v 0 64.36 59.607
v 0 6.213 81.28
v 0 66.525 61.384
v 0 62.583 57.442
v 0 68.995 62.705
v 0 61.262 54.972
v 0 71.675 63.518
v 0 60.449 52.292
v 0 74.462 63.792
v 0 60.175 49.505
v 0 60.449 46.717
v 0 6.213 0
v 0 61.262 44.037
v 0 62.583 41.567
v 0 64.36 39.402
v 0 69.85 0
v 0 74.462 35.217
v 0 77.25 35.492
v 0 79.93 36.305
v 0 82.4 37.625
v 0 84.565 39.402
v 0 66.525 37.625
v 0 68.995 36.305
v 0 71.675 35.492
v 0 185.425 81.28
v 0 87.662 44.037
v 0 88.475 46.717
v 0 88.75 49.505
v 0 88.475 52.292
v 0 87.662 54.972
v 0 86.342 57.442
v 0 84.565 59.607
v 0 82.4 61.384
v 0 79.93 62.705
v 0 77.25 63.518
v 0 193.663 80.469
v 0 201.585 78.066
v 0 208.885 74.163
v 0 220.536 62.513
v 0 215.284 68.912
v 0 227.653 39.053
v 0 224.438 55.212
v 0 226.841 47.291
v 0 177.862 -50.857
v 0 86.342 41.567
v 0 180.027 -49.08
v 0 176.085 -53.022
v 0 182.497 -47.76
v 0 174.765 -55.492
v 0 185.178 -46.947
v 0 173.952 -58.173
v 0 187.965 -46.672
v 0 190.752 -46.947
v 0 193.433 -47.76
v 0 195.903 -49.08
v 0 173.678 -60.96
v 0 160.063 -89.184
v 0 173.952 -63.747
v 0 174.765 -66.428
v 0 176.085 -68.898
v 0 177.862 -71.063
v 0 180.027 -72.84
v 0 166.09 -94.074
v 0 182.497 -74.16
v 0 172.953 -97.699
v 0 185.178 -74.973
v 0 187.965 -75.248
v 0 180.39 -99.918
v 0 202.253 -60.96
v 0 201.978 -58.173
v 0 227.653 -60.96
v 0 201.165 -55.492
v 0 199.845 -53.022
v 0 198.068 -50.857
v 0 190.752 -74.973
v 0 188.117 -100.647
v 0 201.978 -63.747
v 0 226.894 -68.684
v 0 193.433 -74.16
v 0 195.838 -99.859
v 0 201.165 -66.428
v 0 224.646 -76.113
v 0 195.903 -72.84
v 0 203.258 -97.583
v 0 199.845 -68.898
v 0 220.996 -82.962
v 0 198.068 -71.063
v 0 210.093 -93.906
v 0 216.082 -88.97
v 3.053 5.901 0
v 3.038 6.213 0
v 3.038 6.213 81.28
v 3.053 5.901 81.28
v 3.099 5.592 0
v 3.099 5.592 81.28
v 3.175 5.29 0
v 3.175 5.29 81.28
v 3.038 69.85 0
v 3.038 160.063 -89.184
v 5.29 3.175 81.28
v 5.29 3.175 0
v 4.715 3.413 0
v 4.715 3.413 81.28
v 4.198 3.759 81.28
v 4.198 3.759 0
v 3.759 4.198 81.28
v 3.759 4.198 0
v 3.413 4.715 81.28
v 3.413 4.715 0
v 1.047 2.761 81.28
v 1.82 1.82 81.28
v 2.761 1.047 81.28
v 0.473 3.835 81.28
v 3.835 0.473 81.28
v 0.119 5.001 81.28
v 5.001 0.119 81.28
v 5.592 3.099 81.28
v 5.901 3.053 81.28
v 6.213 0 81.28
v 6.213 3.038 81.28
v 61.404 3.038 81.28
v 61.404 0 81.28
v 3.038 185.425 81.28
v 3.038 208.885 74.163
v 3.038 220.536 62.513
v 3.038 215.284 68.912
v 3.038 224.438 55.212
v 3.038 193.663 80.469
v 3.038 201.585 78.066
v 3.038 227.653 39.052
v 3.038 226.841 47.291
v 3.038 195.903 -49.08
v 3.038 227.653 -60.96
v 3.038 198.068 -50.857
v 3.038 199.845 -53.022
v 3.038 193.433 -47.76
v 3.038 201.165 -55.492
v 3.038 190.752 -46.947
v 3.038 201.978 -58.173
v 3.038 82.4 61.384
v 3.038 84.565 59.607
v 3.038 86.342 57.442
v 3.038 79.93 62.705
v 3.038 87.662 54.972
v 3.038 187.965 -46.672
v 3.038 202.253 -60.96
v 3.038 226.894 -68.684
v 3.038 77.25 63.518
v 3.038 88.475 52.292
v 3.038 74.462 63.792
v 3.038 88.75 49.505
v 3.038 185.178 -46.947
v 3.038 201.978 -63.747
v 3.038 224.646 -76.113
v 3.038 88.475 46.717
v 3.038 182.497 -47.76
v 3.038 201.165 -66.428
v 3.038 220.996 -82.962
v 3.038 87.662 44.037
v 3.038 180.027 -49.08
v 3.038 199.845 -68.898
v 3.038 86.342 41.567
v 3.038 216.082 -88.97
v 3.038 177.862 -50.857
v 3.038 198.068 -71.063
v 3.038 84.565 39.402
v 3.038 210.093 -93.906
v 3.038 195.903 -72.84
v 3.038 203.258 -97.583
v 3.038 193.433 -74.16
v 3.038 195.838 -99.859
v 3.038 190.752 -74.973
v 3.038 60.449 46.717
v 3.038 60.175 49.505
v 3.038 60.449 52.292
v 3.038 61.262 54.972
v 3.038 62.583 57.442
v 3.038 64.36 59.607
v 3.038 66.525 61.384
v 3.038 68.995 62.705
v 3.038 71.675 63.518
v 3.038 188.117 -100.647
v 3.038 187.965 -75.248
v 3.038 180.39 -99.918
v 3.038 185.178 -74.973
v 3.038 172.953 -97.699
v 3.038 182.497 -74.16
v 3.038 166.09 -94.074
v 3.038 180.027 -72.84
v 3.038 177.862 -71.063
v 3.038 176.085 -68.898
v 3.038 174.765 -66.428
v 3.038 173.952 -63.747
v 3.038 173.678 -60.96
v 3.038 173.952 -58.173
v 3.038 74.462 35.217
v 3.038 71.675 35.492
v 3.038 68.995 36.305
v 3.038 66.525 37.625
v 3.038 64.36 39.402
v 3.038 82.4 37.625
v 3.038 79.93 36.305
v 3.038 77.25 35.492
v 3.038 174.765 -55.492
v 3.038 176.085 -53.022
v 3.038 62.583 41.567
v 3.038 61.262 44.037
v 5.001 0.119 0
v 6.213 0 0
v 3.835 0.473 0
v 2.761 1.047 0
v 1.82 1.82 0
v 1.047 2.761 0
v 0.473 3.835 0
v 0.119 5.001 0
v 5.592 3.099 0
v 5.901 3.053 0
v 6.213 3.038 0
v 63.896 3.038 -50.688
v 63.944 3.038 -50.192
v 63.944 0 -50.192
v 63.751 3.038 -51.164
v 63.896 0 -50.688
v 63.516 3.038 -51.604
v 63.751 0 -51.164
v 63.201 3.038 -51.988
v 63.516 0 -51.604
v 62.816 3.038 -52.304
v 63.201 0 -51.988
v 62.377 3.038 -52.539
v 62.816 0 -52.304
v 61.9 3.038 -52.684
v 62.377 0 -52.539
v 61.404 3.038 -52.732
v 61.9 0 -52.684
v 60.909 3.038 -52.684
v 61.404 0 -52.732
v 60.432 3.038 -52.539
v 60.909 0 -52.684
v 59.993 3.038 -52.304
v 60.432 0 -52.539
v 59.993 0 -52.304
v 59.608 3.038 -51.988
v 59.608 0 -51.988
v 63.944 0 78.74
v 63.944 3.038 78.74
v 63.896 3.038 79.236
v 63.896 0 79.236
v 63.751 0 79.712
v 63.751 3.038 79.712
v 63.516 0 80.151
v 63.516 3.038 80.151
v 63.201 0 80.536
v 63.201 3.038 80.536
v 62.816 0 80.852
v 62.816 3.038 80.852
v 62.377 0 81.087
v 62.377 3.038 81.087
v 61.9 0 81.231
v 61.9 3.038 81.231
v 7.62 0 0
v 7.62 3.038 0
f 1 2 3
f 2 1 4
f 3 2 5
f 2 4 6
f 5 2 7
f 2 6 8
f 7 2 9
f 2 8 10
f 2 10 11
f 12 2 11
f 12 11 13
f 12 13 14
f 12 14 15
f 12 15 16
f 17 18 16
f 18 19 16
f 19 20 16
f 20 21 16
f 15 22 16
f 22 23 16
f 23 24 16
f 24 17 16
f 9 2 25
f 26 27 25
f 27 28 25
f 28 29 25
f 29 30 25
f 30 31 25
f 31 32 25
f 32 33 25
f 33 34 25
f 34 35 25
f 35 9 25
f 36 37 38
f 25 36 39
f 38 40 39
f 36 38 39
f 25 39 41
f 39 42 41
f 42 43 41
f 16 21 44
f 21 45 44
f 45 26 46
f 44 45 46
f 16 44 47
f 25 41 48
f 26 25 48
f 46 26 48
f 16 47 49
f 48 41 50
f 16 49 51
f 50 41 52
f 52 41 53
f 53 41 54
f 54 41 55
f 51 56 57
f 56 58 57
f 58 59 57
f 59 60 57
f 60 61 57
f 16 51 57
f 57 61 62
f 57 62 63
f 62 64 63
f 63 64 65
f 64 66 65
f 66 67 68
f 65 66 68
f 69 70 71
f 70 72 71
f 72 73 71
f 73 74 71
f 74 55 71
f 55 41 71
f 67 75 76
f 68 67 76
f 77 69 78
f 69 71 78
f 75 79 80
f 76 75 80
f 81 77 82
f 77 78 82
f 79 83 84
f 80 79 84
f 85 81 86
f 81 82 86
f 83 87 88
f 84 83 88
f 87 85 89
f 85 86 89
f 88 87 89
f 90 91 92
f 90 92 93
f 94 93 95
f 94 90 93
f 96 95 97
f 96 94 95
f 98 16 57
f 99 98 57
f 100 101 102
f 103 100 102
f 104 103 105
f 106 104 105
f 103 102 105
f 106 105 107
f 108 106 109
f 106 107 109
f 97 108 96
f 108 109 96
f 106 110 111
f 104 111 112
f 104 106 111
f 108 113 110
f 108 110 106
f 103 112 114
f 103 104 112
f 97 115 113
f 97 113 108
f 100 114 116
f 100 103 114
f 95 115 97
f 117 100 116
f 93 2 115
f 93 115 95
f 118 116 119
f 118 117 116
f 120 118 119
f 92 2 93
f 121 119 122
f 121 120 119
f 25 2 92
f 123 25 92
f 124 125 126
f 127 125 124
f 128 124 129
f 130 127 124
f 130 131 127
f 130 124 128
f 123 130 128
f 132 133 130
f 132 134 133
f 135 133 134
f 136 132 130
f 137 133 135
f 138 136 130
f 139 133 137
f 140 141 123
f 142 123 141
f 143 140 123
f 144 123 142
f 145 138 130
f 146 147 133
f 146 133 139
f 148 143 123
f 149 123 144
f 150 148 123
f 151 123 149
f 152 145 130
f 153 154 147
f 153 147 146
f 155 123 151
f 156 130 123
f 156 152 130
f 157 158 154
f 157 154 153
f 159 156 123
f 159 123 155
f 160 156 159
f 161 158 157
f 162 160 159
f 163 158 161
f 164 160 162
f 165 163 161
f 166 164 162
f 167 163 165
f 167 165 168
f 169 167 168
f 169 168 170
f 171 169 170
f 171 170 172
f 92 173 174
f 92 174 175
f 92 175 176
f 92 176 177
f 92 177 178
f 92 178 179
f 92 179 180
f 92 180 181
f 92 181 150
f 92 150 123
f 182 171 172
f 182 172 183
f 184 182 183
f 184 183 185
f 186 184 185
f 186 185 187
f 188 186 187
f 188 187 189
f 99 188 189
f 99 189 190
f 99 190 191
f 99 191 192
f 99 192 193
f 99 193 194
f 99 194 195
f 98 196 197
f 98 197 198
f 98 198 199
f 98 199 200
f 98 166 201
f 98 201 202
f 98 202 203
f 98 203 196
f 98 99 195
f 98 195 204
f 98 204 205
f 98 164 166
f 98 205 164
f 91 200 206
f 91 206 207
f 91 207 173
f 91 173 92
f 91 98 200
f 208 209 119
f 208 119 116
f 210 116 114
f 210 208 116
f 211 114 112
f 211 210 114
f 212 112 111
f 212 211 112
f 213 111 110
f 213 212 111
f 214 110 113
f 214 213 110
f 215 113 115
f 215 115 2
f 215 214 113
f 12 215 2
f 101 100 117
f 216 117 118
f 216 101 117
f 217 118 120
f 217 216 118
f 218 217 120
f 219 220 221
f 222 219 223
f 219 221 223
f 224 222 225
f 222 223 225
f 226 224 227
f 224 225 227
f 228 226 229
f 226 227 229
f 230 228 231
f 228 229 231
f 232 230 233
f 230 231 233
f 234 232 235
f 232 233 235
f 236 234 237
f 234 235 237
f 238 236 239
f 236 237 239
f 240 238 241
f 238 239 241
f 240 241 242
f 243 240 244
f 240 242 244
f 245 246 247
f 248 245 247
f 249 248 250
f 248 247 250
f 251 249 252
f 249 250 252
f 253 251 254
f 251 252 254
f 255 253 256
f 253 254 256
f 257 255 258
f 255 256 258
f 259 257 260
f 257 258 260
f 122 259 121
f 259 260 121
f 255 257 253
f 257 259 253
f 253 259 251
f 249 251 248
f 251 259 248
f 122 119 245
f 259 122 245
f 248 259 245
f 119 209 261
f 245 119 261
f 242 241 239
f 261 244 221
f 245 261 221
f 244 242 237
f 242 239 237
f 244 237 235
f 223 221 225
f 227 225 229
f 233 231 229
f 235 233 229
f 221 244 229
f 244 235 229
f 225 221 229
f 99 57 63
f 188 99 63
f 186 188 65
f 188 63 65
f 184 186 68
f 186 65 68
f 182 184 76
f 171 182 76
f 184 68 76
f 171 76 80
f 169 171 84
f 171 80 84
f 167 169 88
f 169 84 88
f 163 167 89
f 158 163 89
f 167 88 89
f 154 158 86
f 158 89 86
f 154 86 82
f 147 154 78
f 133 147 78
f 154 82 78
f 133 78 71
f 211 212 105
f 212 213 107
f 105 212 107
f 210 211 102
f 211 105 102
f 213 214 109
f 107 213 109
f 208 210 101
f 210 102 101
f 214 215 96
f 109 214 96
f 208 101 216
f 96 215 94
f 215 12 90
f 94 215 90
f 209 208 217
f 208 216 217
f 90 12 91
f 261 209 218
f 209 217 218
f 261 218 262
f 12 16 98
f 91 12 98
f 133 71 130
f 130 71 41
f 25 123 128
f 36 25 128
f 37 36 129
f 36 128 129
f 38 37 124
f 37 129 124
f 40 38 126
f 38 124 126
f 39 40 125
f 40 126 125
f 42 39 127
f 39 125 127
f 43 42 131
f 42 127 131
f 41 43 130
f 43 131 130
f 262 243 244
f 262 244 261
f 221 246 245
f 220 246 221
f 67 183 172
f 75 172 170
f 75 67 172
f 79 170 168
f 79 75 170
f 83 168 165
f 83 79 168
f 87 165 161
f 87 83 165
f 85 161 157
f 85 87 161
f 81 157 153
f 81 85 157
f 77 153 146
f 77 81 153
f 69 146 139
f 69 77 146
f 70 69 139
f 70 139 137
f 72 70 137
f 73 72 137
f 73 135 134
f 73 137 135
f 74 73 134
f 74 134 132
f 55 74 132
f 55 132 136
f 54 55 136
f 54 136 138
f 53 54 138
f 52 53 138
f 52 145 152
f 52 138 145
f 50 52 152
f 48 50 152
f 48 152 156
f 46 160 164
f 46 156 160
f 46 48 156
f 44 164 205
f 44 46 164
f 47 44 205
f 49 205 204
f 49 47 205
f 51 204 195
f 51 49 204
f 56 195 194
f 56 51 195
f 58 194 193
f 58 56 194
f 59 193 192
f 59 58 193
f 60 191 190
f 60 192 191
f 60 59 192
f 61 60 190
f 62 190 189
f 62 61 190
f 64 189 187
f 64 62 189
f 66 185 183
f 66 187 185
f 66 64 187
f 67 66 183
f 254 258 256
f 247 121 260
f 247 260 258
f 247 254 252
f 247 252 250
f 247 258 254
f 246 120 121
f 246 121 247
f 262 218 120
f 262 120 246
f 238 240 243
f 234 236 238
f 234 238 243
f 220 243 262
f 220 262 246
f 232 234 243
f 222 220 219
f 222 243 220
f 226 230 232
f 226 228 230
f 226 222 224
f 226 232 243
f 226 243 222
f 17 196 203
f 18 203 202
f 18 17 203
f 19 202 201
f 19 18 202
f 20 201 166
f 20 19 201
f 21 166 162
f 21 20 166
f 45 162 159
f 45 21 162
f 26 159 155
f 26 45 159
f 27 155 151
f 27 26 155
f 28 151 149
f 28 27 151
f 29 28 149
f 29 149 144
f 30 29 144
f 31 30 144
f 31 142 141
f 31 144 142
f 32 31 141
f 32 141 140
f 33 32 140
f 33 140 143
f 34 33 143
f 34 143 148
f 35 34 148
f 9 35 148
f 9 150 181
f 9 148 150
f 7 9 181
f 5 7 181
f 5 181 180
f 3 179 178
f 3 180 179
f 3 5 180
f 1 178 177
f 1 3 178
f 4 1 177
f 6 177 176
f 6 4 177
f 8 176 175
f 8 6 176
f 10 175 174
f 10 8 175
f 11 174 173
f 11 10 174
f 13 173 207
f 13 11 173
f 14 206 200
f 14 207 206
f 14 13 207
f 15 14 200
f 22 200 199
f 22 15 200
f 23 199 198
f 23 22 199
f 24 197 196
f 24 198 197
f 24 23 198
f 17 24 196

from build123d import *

# Parameters (mm, degrees)
SKETCH2_R              = 14.2875
SKETCH2_W              = 81.28
SKETCH2_H              = 3.175
BOSS_EXTRUDE1_DEPTH    = 3.175
SKETCH9_R              = 14.2875
CUT_EXTRUDE2_DEPTH     = 3.175
BOSS_EXTRUDE2_START    = 3.175
SKETCH2_3_W            = 81.28
SKETCH2_3_H            = 3.175
BOSS_EXTRUDE2_DEPTH    = 60.7695
BOSS_EXTRUDE3_DEPTH    = 3.175
FILLET1_R              = 2.54
FILLET2_R              = 42.2275
CONVERT_SOLID2_START   = -100.6475
CONVERT_SOLID2_DEPTH   = 181.9275
CONVERT_SOLID2_2_DEPTH = 81.28


# Read off the part's stored shape, not the designer's step: Convert-Solid2
with BuildPart() as part:
    # Sketch2 → Boss-Extrude1 (new body)
    # profile 1 of 2: a face of its own
    with BuildSketch(Plane(origin=(0, 0, 0), x_dir=(0, 0, -1), z_dir=(1, 0, 0))):
        with BuildLine():
            Line((0, 3.175), (0, 69.85))
            Line((0, 69.85), (89.183866464, 160.063269699))
            ThreePointArc((89.183866464, 160.063269699), (97.582743975, 203.257963311), (60.96, 227.65258))
            Line((60.96, 227.65258), (-81.28, 227.65258))
            Line((-81.28, 227.65258), (-81.28, 69.85))
            Line((-81.28, 69.85), (-81.28, 3.175))
            Line((-81.28, 3.175), (0, 3.175))
        make_face()
        with Locations((60.96, 187.96508)):
            Circle(SKETCH2_R, mode=Mode.SUBTRACT)
    # profile 2 of 2: a face of its own
    with BuildSketch(Plane(origin=(0, 0, 0), x_dir=(0, 0, -1), z_dir=(1, 0, 0))):
        with Locations((-40.64, 1.5875)):
            Rectangle(SKETCH2_W, SKETCH2_H)
    extrude(amount=BOSS_EXTRUDE1_DEPTH)

    # Sketch9 → Cut-Extrude2 (cut)
    with BuildSketch(Plane(origin=(0, 0, 0), x_dir=(0, 0, -1), z_dir=(1, 0, 0))):
        with Locations((-49.5046, 74.46228868)):
            Circle(SKETCH9_R)
    extrude(amount=CUT_EXTRUDE2_DEPTH, mode=Mode.SUBTRACT)

    # Sketch2<3> → Boss-Extrude2 (add)
    with BuildSketch(Plane(origin=(0, 0, 0), x_dir=(0, 0, -1), z_dir=(1, 0, 0)).offset(BOSS_EXTRUDE2_START)):
        with Locations((-40.64, 1.5875)):
            Rectangle(SKETCH2_3_W, SKETCH2_3_H)
    extrude(amount=BOSS_EXTRUDE2_DEPTH)

    # Sketch3 → Boss-Extrude3 (add)
    with BuildSketch(Plane(origin=(0, 3.175, 0), x_dir=(1, 0, 0), z_dir=(0, 1, 0))):
        Polygon((63.9445, 0), (63.9445, 56.3245), (7.62, 0), align=None)
    extrude(amount=-BOSS_EXTRUDE3_DEPTH)

    # Fillet1
    fillet1_edges = [part.edges().sort_by_distance(p)[0] for p in [
        (63.9445, 1.5875, 81.28),
        (63.9445, 1.5875, -56.3245),
    ]]
    fillet(fillet1_edges, radius=FILLET1_R)

    # Fillet2
    fillet2_edges = [part.edges().sort_by_distance(p)[0] for p in [
        (1.5875, 227.65258, 81.28),
    ]]
    fillet(fillet2_edges, radius=FILLET2_R)

    # Convert-Solid2 outline → Convert-Solid2 (cut)
    with BuildSketch(Plane.XY.offset(CONVERT_SOLID2_START)):
        with BuildLine():
            Line((0, 0), (6.21284, 0))
            ThreePointArc((6.21284, 0), (1.819698706, 1.819698706), (0, 6.21284))
            Line((0, 6.21284), (0, 0))
        make_face()
        with BuildLine():
            Line((6.21284, 3.03784), (63.9445, 3.03784))
            Line((63.9445, 3.03784), (63.9445, 3.175))
            Line((63.9445, 3.175), (5.289718593, 3.175))
            ThreePointArc((5.289718593, 3.175), (5.746212204, 3.072317193), (6.21284, 3.03784))
        make_face()
        with BuildLine():
            Line((3.175, 227.65258), (3.03784, 227.65258))
            Line((3.03784, 227.65258), (3.03784, 6.21284))
            ThreePointArc((3.03784, 6.21284), (3.072317193, 5.746212204), (3.175, 5.289718593))
            Line((3.175, 5.289718593), (3.175, 227.65258))
        make_face()
    extrude(amount=CONVERT_SOLID2_DEPTH, mode=Mode.SUBTRACT)

    # Convert-Solid2 2 outline → Convert-Solid2 2 (add)
    with BuildSketch(Plane.XY):
        with BuildLine():
            Line((3.175, 3.175), (5.289718593, 3.175))
            ThreePointArc((5.289718593, 3.175), (3.96777597, 3.96777597), (3.175, 5.289718593))
            Line((3.175, 5.289718593), (3.175, 3.175))
        make_face()
    extrude(amount=CONVERT_SOLID2_2_DEPTH)


solid = part.part
